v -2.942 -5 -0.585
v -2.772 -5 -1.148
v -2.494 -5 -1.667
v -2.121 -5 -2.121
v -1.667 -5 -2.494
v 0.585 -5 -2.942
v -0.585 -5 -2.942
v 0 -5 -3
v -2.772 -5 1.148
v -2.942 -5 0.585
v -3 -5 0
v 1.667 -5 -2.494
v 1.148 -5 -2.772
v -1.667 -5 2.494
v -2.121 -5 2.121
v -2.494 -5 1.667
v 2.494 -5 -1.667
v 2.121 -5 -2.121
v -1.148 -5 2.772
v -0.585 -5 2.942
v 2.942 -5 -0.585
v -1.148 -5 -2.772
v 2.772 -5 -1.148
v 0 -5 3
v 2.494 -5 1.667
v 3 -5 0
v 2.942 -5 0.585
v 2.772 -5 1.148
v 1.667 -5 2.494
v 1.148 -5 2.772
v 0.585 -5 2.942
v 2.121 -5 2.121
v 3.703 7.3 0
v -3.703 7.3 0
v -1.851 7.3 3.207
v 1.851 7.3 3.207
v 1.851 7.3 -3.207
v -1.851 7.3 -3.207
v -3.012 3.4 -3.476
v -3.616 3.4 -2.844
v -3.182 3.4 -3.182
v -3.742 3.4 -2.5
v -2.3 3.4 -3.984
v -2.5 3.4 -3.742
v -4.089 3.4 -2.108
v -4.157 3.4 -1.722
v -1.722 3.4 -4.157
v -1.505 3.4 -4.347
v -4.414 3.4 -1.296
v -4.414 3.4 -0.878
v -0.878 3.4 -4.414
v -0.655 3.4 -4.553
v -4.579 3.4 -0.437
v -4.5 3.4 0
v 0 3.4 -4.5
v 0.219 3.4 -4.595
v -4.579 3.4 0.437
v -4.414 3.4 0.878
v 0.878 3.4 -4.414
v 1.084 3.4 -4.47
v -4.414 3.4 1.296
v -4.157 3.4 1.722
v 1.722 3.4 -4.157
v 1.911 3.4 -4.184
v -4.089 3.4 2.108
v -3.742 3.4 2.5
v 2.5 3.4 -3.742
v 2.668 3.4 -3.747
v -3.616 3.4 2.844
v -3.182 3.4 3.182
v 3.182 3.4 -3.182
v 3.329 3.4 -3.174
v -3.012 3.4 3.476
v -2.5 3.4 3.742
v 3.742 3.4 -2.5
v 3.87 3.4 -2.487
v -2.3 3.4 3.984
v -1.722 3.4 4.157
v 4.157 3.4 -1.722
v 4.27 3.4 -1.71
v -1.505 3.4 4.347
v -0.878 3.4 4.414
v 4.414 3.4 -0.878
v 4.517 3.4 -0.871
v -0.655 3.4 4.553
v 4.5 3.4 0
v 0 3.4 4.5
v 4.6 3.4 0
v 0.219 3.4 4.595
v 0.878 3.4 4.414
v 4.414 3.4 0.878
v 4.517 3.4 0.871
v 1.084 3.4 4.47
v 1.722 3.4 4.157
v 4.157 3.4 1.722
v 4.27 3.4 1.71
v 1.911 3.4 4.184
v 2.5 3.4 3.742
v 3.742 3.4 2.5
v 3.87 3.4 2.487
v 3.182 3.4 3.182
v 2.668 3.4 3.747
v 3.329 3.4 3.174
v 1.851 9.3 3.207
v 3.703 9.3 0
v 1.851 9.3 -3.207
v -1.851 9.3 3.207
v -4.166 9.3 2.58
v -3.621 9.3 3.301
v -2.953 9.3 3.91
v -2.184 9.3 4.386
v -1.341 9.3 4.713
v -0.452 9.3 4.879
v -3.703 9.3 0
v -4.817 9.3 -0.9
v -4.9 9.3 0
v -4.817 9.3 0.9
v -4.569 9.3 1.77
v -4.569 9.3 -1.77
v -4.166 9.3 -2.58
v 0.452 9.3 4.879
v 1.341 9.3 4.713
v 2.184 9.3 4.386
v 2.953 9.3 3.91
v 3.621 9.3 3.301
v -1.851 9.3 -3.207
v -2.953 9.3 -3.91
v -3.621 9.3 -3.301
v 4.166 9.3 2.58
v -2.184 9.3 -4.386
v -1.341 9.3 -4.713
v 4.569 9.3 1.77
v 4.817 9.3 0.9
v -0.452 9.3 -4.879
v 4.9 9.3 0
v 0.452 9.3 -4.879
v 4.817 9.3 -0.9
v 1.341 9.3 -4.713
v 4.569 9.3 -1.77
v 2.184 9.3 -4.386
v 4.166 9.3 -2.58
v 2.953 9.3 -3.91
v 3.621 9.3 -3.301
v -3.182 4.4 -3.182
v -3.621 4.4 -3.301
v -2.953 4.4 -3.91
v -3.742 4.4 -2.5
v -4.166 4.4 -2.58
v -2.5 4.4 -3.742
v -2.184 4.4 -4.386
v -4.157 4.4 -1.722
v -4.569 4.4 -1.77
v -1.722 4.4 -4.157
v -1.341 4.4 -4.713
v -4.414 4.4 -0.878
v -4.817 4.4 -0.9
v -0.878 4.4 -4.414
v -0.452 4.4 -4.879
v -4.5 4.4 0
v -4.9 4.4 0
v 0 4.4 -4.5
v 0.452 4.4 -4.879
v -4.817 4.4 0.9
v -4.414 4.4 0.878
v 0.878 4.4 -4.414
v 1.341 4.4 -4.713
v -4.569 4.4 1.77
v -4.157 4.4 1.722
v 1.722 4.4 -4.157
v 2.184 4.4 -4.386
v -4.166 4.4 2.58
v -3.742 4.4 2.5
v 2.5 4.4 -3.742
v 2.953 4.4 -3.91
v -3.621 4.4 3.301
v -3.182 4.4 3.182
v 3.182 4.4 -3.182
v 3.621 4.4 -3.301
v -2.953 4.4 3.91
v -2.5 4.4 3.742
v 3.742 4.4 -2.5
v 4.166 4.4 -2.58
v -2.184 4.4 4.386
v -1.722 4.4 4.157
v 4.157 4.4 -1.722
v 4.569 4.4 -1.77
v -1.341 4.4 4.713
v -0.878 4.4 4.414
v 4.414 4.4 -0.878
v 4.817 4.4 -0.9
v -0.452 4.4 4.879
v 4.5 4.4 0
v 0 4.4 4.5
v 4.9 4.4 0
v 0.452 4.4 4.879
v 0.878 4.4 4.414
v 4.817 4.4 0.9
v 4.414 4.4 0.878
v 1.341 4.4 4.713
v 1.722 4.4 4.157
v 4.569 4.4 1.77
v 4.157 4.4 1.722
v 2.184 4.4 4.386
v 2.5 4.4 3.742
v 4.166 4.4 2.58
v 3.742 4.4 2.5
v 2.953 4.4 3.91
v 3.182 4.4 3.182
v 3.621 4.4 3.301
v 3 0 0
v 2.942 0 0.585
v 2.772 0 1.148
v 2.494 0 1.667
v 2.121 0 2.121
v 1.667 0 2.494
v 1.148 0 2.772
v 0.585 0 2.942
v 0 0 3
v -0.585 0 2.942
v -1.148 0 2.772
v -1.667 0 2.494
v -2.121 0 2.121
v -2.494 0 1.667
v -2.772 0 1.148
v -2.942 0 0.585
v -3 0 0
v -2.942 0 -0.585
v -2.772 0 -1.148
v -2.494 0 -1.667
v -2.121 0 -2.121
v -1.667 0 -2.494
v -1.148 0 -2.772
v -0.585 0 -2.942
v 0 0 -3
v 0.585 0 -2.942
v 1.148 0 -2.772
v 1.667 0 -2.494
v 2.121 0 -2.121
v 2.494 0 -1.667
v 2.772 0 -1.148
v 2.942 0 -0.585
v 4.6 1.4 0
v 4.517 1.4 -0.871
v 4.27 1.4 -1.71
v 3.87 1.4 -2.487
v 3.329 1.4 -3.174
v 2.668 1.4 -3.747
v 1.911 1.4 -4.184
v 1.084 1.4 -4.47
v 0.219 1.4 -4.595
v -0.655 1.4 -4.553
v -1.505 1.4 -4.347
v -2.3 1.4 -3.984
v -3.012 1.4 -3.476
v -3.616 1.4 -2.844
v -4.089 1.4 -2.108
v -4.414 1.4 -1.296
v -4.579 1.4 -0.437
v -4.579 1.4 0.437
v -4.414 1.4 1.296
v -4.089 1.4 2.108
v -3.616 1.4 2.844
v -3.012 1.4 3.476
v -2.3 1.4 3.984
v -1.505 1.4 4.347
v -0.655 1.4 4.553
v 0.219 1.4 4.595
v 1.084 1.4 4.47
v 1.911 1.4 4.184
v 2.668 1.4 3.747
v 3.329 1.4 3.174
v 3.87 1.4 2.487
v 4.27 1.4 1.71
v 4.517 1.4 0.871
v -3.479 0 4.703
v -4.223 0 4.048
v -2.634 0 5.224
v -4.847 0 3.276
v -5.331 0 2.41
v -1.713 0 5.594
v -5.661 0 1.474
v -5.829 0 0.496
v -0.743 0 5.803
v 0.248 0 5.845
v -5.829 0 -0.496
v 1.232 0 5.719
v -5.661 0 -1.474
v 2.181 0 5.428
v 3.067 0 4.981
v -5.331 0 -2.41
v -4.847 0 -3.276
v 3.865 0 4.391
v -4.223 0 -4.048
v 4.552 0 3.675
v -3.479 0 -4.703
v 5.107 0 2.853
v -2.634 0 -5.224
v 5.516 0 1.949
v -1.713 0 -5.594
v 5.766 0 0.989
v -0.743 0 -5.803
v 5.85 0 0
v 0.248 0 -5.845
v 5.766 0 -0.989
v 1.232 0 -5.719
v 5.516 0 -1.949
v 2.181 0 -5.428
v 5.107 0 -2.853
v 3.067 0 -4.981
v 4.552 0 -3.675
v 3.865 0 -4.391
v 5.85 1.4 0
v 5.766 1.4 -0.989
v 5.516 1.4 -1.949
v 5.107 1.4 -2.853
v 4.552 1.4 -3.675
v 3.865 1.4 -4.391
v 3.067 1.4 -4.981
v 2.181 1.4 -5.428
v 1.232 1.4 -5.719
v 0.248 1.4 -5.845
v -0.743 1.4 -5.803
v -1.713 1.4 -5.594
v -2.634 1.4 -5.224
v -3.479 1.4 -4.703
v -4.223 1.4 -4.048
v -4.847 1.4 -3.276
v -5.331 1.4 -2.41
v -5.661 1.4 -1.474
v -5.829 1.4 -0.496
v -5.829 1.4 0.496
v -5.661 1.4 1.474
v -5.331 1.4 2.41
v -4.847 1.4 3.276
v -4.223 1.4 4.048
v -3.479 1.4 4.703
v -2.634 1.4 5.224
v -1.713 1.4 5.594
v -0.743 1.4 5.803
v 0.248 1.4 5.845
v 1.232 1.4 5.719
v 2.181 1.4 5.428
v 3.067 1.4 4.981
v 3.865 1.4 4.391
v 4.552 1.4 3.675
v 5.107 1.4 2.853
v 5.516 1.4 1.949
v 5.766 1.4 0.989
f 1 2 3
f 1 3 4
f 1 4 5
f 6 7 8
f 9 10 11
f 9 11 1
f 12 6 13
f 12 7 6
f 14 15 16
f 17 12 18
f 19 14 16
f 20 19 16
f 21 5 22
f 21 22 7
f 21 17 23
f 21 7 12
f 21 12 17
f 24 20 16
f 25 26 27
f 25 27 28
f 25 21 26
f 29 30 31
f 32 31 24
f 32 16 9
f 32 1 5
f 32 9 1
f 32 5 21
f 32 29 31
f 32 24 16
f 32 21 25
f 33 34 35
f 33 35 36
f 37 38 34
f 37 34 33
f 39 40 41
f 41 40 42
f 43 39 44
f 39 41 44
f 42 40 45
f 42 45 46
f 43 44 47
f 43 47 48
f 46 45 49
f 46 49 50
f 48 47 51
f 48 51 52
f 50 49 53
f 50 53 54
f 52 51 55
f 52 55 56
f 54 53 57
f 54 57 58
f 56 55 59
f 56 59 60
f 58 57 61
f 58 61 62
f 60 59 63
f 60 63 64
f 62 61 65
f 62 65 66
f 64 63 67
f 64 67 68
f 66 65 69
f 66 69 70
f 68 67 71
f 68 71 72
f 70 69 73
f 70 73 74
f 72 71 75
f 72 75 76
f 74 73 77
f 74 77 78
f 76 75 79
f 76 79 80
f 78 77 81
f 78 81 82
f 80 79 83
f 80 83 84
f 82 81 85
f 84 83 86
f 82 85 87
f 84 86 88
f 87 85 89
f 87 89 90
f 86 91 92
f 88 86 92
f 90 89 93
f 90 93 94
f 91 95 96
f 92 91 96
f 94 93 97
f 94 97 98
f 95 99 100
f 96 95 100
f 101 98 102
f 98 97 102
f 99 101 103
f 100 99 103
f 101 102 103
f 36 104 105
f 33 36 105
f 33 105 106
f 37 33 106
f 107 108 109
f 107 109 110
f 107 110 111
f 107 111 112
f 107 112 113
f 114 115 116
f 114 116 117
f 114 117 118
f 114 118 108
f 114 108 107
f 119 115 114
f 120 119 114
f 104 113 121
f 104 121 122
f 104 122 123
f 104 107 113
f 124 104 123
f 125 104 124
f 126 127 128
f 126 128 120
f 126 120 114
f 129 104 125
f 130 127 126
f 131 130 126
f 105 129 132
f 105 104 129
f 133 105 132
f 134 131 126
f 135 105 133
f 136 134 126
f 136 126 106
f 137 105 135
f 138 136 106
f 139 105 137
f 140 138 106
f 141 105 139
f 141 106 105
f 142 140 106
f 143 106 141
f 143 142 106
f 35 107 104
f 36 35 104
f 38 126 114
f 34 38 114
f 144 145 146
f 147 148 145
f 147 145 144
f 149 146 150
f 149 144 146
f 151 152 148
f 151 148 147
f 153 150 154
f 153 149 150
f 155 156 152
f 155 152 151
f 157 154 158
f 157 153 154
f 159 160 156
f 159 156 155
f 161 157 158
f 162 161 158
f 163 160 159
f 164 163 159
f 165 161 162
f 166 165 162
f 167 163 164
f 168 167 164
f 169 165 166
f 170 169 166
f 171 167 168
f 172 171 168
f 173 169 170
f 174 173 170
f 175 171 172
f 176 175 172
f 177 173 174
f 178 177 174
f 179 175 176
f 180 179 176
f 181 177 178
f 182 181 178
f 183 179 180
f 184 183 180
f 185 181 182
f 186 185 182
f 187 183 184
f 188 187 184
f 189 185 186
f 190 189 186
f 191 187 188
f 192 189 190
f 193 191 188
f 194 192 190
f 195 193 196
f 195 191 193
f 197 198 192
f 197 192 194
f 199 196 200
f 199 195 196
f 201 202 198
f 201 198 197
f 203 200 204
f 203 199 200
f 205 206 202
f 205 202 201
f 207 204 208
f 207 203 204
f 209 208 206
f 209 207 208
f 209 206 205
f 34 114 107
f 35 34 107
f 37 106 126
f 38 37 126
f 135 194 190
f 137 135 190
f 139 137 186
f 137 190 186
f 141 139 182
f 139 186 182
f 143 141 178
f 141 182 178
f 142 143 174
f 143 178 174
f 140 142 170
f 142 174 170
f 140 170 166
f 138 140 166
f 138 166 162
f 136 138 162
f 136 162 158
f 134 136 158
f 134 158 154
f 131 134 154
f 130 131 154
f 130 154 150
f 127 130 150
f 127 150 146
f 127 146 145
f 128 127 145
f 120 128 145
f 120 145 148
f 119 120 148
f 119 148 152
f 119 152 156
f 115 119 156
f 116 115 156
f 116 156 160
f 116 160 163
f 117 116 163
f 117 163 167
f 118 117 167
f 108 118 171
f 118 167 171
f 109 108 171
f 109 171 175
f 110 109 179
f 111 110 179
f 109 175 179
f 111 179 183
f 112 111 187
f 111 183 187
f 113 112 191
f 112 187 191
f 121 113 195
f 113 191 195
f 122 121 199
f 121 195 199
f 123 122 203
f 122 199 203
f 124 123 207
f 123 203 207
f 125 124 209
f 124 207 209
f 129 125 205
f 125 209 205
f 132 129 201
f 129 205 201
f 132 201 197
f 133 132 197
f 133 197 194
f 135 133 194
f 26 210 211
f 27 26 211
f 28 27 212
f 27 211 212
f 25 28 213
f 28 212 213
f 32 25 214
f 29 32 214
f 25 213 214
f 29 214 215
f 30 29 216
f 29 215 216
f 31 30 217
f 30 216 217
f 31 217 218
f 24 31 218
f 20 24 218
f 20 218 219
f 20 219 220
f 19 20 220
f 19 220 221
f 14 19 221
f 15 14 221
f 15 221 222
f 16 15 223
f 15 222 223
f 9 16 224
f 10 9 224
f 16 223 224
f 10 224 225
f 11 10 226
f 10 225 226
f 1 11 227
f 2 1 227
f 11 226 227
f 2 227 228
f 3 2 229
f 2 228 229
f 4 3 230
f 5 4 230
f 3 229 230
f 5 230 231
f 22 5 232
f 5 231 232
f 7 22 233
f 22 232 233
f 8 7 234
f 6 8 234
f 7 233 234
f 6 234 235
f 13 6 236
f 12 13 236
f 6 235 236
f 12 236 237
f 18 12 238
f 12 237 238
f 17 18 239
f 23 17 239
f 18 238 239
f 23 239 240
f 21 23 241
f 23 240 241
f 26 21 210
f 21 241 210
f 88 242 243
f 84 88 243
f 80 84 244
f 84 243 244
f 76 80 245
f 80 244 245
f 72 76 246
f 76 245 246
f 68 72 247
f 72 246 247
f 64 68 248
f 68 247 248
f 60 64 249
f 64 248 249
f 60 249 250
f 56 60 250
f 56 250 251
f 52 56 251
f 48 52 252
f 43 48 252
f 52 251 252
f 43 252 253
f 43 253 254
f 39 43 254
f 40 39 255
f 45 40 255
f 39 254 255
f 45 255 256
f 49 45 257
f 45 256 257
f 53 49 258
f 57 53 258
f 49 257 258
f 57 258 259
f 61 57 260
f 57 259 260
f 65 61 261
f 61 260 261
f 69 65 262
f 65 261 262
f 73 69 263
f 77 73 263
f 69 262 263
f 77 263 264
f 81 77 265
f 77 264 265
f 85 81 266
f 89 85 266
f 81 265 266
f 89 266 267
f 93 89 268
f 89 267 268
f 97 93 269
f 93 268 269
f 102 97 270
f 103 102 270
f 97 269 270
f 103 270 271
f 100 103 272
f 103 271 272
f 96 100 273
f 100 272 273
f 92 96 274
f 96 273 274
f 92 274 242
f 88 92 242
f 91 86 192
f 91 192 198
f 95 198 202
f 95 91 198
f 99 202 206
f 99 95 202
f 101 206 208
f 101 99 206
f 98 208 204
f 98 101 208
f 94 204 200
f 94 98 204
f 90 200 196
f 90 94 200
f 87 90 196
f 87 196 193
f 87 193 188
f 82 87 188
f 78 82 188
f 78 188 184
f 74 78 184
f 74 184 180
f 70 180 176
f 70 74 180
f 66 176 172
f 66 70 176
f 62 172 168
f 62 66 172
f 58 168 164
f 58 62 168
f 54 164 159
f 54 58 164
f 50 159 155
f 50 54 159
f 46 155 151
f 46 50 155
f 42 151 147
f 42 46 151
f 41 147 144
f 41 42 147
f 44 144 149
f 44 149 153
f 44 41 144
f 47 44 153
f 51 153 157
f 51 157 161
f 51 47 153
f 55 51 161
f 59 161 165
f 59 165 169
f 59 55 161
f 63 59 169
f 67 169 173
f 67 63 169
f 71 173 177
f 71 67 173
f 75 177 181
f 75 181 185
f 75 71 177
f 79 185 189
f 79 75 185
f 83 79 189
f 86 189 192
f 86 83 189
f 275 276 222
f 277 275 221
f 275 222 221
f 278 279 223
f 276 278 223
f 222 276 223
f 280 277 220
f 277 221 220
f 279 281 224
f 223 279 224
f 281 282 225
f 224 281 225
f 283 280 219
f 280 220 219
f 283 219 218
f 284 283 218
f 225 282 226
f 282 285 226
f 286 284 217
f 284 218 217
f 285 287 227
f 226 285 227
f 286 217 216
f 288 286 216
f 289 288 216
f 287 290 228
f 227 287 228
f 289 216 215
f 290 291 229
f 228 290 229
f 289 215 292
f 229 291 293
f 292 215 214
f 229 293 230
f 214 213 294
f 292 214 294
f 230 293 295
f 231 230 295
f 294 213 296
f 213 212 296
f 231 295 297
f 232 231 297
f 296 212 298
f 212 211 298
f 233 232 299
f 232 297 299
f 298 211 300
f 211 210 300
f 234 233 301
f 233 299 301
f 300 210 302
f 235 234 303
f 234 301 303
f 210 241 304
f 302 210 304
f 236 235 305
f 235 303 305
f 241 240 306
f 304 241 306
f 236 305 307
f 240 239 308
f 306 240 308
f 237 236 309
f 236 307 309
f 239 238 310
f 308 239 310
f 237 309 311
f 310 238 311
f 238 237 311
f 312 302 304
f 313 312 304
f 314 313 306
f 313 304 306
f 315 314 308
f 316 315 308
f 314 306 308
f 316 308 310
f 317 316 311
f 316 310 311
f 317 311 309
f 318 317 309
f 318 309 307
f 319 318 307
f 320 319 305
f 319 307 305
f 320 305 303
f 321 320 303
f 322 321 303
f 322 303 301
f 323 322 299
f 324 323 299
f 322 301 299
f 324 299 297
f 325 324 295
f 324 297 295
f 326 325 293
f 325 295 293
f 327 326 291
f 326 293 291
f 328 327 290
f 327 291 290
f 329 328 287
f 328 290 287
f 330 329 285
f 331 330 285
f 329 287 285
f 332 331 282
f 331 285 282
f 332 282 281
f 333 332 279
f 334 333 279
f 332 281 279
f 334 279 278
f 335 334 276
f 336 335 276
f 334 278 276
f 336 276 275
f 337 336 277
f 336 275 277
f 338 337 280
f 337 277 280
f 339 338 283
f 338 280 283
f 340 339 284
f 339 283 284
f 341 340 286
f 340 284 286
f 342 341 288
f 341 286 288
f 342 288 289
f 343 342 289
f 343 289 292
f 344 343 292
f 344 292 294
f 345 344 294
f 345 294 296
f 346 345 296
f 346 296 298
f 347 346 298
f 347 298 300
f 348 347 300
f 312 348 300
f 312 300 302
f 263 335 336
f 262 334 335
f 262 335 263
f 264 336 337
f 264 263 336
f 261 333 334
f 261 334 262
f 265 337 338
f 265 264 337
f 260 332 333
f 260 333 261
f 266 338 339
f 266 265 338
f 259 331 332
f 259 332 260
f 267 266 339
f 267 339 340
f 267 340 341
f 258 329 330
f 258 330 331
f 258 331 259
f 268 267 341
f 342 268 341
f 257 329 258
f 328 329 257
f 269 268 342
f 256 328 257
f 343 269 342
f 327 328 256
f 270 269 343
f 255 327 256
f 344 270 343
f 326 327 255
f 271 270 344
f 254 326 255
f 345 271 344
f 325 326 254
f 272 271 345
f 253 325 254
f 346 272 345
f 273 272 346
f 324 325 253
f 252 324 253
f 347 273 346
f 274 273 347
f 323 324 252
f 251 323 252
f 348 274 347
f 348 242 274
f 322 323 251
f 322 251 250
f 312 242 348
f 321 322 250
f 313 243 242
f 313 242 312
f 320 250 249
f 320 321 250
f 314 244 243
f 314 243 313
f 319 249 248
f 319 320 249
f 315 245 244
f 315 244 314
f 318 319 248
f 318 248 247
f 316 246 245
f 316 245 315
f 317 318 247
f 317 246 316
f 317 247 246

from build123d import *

# Parameters (mm, degrees)
SKETCH_1_R          = 5.85
EXTRUDE_1_DEPTH     = 1.4
SKETCH_2_R          = 4.6
EXTRUDE_2_DEPTH     = 2
SKETCH_3_R          = 4.9
EXTRUDE_3_DEPTH     = 5.9
SKETCH_4_R          = 10.526345736
SKETCH_4_R_2        = 4.5
CUT_EXTRUDE_1_DEPTH = 1
CUT_EXTRUDE_2_DEPTH = 2
SKETCH_6_R          = 3
EXTRUDE_4_DEPTH     = 5


with BuildPart() as part:
    # 草图1 → 凸台-拉伸1 (new body)
    with BuildSketch(Plane(origin=(0, 0, 0), x_dir=(1, 0, 0), z_dir=(0, 1, 0))):
        Circle(SKETCH_1_R)
    extrude(amount=EXTRUDE_1_DEPTH)

    # 草图2 → 凸台-拉伸2 (add)
    with BuildSketch(Plane(origin=(0, 1.4, 0), x_dir=(1, 0, 0), z_dir=(0, 1, 0))):
        Circle(SKETCH_2_R)
    extrude(amount=EXTRUDE_2_DEPTH)

    # 草图3 → 凸台-拉伸3 (add)
    with BuildSketch(Plane(origin=(0, 3.4, 0), x_dir=(1, 0, 0), z_dir=(0, 1, 0))):
        Circle(SKETCH_3_R)
    extrude(amount=EXTRUDE_3_DEPTH)

    # 草图4 → 切除-拉伸1 (cut)
    with BuildSketch(Plane.XZ.offset(-3.4)):
        Circle(SKETCH_4_R)
        Circle(SKETCH_4_R_2, mode=Mode.SUBTRACT)
    extrude(amount=-CUT_EXTRUDE_1_DEPTH, mode=Mode.SUBTRACT)

    # 草图5 → 切除-拉伸2 (cut)
    with BuildSketch(Plane(origin=(0, 9.3, 0), x_dir=(1, 0, 0), z_dir=(0, 1, 0))):
        Polygon((-3.702575932, 0), (-1.851287966, -3.206524817), (1.851287966, -3.206524817), (3.702575932, 0), (1.851287966, 3.206524817), (-1.851287966, 3.206524817), align=None)
    extrude(amount=-CUT_EXTRUDE_2_DEPTH, mode=Mode.SUBTRACT)

    # 草图6 → 凸台-拉伸4 (add)
    with BuildSketch(Plane.XZ):
        Circle(SKETCH_6_R)
    extrude(amount=EXTRUDE_4_DEPTH)


solid = part.part
